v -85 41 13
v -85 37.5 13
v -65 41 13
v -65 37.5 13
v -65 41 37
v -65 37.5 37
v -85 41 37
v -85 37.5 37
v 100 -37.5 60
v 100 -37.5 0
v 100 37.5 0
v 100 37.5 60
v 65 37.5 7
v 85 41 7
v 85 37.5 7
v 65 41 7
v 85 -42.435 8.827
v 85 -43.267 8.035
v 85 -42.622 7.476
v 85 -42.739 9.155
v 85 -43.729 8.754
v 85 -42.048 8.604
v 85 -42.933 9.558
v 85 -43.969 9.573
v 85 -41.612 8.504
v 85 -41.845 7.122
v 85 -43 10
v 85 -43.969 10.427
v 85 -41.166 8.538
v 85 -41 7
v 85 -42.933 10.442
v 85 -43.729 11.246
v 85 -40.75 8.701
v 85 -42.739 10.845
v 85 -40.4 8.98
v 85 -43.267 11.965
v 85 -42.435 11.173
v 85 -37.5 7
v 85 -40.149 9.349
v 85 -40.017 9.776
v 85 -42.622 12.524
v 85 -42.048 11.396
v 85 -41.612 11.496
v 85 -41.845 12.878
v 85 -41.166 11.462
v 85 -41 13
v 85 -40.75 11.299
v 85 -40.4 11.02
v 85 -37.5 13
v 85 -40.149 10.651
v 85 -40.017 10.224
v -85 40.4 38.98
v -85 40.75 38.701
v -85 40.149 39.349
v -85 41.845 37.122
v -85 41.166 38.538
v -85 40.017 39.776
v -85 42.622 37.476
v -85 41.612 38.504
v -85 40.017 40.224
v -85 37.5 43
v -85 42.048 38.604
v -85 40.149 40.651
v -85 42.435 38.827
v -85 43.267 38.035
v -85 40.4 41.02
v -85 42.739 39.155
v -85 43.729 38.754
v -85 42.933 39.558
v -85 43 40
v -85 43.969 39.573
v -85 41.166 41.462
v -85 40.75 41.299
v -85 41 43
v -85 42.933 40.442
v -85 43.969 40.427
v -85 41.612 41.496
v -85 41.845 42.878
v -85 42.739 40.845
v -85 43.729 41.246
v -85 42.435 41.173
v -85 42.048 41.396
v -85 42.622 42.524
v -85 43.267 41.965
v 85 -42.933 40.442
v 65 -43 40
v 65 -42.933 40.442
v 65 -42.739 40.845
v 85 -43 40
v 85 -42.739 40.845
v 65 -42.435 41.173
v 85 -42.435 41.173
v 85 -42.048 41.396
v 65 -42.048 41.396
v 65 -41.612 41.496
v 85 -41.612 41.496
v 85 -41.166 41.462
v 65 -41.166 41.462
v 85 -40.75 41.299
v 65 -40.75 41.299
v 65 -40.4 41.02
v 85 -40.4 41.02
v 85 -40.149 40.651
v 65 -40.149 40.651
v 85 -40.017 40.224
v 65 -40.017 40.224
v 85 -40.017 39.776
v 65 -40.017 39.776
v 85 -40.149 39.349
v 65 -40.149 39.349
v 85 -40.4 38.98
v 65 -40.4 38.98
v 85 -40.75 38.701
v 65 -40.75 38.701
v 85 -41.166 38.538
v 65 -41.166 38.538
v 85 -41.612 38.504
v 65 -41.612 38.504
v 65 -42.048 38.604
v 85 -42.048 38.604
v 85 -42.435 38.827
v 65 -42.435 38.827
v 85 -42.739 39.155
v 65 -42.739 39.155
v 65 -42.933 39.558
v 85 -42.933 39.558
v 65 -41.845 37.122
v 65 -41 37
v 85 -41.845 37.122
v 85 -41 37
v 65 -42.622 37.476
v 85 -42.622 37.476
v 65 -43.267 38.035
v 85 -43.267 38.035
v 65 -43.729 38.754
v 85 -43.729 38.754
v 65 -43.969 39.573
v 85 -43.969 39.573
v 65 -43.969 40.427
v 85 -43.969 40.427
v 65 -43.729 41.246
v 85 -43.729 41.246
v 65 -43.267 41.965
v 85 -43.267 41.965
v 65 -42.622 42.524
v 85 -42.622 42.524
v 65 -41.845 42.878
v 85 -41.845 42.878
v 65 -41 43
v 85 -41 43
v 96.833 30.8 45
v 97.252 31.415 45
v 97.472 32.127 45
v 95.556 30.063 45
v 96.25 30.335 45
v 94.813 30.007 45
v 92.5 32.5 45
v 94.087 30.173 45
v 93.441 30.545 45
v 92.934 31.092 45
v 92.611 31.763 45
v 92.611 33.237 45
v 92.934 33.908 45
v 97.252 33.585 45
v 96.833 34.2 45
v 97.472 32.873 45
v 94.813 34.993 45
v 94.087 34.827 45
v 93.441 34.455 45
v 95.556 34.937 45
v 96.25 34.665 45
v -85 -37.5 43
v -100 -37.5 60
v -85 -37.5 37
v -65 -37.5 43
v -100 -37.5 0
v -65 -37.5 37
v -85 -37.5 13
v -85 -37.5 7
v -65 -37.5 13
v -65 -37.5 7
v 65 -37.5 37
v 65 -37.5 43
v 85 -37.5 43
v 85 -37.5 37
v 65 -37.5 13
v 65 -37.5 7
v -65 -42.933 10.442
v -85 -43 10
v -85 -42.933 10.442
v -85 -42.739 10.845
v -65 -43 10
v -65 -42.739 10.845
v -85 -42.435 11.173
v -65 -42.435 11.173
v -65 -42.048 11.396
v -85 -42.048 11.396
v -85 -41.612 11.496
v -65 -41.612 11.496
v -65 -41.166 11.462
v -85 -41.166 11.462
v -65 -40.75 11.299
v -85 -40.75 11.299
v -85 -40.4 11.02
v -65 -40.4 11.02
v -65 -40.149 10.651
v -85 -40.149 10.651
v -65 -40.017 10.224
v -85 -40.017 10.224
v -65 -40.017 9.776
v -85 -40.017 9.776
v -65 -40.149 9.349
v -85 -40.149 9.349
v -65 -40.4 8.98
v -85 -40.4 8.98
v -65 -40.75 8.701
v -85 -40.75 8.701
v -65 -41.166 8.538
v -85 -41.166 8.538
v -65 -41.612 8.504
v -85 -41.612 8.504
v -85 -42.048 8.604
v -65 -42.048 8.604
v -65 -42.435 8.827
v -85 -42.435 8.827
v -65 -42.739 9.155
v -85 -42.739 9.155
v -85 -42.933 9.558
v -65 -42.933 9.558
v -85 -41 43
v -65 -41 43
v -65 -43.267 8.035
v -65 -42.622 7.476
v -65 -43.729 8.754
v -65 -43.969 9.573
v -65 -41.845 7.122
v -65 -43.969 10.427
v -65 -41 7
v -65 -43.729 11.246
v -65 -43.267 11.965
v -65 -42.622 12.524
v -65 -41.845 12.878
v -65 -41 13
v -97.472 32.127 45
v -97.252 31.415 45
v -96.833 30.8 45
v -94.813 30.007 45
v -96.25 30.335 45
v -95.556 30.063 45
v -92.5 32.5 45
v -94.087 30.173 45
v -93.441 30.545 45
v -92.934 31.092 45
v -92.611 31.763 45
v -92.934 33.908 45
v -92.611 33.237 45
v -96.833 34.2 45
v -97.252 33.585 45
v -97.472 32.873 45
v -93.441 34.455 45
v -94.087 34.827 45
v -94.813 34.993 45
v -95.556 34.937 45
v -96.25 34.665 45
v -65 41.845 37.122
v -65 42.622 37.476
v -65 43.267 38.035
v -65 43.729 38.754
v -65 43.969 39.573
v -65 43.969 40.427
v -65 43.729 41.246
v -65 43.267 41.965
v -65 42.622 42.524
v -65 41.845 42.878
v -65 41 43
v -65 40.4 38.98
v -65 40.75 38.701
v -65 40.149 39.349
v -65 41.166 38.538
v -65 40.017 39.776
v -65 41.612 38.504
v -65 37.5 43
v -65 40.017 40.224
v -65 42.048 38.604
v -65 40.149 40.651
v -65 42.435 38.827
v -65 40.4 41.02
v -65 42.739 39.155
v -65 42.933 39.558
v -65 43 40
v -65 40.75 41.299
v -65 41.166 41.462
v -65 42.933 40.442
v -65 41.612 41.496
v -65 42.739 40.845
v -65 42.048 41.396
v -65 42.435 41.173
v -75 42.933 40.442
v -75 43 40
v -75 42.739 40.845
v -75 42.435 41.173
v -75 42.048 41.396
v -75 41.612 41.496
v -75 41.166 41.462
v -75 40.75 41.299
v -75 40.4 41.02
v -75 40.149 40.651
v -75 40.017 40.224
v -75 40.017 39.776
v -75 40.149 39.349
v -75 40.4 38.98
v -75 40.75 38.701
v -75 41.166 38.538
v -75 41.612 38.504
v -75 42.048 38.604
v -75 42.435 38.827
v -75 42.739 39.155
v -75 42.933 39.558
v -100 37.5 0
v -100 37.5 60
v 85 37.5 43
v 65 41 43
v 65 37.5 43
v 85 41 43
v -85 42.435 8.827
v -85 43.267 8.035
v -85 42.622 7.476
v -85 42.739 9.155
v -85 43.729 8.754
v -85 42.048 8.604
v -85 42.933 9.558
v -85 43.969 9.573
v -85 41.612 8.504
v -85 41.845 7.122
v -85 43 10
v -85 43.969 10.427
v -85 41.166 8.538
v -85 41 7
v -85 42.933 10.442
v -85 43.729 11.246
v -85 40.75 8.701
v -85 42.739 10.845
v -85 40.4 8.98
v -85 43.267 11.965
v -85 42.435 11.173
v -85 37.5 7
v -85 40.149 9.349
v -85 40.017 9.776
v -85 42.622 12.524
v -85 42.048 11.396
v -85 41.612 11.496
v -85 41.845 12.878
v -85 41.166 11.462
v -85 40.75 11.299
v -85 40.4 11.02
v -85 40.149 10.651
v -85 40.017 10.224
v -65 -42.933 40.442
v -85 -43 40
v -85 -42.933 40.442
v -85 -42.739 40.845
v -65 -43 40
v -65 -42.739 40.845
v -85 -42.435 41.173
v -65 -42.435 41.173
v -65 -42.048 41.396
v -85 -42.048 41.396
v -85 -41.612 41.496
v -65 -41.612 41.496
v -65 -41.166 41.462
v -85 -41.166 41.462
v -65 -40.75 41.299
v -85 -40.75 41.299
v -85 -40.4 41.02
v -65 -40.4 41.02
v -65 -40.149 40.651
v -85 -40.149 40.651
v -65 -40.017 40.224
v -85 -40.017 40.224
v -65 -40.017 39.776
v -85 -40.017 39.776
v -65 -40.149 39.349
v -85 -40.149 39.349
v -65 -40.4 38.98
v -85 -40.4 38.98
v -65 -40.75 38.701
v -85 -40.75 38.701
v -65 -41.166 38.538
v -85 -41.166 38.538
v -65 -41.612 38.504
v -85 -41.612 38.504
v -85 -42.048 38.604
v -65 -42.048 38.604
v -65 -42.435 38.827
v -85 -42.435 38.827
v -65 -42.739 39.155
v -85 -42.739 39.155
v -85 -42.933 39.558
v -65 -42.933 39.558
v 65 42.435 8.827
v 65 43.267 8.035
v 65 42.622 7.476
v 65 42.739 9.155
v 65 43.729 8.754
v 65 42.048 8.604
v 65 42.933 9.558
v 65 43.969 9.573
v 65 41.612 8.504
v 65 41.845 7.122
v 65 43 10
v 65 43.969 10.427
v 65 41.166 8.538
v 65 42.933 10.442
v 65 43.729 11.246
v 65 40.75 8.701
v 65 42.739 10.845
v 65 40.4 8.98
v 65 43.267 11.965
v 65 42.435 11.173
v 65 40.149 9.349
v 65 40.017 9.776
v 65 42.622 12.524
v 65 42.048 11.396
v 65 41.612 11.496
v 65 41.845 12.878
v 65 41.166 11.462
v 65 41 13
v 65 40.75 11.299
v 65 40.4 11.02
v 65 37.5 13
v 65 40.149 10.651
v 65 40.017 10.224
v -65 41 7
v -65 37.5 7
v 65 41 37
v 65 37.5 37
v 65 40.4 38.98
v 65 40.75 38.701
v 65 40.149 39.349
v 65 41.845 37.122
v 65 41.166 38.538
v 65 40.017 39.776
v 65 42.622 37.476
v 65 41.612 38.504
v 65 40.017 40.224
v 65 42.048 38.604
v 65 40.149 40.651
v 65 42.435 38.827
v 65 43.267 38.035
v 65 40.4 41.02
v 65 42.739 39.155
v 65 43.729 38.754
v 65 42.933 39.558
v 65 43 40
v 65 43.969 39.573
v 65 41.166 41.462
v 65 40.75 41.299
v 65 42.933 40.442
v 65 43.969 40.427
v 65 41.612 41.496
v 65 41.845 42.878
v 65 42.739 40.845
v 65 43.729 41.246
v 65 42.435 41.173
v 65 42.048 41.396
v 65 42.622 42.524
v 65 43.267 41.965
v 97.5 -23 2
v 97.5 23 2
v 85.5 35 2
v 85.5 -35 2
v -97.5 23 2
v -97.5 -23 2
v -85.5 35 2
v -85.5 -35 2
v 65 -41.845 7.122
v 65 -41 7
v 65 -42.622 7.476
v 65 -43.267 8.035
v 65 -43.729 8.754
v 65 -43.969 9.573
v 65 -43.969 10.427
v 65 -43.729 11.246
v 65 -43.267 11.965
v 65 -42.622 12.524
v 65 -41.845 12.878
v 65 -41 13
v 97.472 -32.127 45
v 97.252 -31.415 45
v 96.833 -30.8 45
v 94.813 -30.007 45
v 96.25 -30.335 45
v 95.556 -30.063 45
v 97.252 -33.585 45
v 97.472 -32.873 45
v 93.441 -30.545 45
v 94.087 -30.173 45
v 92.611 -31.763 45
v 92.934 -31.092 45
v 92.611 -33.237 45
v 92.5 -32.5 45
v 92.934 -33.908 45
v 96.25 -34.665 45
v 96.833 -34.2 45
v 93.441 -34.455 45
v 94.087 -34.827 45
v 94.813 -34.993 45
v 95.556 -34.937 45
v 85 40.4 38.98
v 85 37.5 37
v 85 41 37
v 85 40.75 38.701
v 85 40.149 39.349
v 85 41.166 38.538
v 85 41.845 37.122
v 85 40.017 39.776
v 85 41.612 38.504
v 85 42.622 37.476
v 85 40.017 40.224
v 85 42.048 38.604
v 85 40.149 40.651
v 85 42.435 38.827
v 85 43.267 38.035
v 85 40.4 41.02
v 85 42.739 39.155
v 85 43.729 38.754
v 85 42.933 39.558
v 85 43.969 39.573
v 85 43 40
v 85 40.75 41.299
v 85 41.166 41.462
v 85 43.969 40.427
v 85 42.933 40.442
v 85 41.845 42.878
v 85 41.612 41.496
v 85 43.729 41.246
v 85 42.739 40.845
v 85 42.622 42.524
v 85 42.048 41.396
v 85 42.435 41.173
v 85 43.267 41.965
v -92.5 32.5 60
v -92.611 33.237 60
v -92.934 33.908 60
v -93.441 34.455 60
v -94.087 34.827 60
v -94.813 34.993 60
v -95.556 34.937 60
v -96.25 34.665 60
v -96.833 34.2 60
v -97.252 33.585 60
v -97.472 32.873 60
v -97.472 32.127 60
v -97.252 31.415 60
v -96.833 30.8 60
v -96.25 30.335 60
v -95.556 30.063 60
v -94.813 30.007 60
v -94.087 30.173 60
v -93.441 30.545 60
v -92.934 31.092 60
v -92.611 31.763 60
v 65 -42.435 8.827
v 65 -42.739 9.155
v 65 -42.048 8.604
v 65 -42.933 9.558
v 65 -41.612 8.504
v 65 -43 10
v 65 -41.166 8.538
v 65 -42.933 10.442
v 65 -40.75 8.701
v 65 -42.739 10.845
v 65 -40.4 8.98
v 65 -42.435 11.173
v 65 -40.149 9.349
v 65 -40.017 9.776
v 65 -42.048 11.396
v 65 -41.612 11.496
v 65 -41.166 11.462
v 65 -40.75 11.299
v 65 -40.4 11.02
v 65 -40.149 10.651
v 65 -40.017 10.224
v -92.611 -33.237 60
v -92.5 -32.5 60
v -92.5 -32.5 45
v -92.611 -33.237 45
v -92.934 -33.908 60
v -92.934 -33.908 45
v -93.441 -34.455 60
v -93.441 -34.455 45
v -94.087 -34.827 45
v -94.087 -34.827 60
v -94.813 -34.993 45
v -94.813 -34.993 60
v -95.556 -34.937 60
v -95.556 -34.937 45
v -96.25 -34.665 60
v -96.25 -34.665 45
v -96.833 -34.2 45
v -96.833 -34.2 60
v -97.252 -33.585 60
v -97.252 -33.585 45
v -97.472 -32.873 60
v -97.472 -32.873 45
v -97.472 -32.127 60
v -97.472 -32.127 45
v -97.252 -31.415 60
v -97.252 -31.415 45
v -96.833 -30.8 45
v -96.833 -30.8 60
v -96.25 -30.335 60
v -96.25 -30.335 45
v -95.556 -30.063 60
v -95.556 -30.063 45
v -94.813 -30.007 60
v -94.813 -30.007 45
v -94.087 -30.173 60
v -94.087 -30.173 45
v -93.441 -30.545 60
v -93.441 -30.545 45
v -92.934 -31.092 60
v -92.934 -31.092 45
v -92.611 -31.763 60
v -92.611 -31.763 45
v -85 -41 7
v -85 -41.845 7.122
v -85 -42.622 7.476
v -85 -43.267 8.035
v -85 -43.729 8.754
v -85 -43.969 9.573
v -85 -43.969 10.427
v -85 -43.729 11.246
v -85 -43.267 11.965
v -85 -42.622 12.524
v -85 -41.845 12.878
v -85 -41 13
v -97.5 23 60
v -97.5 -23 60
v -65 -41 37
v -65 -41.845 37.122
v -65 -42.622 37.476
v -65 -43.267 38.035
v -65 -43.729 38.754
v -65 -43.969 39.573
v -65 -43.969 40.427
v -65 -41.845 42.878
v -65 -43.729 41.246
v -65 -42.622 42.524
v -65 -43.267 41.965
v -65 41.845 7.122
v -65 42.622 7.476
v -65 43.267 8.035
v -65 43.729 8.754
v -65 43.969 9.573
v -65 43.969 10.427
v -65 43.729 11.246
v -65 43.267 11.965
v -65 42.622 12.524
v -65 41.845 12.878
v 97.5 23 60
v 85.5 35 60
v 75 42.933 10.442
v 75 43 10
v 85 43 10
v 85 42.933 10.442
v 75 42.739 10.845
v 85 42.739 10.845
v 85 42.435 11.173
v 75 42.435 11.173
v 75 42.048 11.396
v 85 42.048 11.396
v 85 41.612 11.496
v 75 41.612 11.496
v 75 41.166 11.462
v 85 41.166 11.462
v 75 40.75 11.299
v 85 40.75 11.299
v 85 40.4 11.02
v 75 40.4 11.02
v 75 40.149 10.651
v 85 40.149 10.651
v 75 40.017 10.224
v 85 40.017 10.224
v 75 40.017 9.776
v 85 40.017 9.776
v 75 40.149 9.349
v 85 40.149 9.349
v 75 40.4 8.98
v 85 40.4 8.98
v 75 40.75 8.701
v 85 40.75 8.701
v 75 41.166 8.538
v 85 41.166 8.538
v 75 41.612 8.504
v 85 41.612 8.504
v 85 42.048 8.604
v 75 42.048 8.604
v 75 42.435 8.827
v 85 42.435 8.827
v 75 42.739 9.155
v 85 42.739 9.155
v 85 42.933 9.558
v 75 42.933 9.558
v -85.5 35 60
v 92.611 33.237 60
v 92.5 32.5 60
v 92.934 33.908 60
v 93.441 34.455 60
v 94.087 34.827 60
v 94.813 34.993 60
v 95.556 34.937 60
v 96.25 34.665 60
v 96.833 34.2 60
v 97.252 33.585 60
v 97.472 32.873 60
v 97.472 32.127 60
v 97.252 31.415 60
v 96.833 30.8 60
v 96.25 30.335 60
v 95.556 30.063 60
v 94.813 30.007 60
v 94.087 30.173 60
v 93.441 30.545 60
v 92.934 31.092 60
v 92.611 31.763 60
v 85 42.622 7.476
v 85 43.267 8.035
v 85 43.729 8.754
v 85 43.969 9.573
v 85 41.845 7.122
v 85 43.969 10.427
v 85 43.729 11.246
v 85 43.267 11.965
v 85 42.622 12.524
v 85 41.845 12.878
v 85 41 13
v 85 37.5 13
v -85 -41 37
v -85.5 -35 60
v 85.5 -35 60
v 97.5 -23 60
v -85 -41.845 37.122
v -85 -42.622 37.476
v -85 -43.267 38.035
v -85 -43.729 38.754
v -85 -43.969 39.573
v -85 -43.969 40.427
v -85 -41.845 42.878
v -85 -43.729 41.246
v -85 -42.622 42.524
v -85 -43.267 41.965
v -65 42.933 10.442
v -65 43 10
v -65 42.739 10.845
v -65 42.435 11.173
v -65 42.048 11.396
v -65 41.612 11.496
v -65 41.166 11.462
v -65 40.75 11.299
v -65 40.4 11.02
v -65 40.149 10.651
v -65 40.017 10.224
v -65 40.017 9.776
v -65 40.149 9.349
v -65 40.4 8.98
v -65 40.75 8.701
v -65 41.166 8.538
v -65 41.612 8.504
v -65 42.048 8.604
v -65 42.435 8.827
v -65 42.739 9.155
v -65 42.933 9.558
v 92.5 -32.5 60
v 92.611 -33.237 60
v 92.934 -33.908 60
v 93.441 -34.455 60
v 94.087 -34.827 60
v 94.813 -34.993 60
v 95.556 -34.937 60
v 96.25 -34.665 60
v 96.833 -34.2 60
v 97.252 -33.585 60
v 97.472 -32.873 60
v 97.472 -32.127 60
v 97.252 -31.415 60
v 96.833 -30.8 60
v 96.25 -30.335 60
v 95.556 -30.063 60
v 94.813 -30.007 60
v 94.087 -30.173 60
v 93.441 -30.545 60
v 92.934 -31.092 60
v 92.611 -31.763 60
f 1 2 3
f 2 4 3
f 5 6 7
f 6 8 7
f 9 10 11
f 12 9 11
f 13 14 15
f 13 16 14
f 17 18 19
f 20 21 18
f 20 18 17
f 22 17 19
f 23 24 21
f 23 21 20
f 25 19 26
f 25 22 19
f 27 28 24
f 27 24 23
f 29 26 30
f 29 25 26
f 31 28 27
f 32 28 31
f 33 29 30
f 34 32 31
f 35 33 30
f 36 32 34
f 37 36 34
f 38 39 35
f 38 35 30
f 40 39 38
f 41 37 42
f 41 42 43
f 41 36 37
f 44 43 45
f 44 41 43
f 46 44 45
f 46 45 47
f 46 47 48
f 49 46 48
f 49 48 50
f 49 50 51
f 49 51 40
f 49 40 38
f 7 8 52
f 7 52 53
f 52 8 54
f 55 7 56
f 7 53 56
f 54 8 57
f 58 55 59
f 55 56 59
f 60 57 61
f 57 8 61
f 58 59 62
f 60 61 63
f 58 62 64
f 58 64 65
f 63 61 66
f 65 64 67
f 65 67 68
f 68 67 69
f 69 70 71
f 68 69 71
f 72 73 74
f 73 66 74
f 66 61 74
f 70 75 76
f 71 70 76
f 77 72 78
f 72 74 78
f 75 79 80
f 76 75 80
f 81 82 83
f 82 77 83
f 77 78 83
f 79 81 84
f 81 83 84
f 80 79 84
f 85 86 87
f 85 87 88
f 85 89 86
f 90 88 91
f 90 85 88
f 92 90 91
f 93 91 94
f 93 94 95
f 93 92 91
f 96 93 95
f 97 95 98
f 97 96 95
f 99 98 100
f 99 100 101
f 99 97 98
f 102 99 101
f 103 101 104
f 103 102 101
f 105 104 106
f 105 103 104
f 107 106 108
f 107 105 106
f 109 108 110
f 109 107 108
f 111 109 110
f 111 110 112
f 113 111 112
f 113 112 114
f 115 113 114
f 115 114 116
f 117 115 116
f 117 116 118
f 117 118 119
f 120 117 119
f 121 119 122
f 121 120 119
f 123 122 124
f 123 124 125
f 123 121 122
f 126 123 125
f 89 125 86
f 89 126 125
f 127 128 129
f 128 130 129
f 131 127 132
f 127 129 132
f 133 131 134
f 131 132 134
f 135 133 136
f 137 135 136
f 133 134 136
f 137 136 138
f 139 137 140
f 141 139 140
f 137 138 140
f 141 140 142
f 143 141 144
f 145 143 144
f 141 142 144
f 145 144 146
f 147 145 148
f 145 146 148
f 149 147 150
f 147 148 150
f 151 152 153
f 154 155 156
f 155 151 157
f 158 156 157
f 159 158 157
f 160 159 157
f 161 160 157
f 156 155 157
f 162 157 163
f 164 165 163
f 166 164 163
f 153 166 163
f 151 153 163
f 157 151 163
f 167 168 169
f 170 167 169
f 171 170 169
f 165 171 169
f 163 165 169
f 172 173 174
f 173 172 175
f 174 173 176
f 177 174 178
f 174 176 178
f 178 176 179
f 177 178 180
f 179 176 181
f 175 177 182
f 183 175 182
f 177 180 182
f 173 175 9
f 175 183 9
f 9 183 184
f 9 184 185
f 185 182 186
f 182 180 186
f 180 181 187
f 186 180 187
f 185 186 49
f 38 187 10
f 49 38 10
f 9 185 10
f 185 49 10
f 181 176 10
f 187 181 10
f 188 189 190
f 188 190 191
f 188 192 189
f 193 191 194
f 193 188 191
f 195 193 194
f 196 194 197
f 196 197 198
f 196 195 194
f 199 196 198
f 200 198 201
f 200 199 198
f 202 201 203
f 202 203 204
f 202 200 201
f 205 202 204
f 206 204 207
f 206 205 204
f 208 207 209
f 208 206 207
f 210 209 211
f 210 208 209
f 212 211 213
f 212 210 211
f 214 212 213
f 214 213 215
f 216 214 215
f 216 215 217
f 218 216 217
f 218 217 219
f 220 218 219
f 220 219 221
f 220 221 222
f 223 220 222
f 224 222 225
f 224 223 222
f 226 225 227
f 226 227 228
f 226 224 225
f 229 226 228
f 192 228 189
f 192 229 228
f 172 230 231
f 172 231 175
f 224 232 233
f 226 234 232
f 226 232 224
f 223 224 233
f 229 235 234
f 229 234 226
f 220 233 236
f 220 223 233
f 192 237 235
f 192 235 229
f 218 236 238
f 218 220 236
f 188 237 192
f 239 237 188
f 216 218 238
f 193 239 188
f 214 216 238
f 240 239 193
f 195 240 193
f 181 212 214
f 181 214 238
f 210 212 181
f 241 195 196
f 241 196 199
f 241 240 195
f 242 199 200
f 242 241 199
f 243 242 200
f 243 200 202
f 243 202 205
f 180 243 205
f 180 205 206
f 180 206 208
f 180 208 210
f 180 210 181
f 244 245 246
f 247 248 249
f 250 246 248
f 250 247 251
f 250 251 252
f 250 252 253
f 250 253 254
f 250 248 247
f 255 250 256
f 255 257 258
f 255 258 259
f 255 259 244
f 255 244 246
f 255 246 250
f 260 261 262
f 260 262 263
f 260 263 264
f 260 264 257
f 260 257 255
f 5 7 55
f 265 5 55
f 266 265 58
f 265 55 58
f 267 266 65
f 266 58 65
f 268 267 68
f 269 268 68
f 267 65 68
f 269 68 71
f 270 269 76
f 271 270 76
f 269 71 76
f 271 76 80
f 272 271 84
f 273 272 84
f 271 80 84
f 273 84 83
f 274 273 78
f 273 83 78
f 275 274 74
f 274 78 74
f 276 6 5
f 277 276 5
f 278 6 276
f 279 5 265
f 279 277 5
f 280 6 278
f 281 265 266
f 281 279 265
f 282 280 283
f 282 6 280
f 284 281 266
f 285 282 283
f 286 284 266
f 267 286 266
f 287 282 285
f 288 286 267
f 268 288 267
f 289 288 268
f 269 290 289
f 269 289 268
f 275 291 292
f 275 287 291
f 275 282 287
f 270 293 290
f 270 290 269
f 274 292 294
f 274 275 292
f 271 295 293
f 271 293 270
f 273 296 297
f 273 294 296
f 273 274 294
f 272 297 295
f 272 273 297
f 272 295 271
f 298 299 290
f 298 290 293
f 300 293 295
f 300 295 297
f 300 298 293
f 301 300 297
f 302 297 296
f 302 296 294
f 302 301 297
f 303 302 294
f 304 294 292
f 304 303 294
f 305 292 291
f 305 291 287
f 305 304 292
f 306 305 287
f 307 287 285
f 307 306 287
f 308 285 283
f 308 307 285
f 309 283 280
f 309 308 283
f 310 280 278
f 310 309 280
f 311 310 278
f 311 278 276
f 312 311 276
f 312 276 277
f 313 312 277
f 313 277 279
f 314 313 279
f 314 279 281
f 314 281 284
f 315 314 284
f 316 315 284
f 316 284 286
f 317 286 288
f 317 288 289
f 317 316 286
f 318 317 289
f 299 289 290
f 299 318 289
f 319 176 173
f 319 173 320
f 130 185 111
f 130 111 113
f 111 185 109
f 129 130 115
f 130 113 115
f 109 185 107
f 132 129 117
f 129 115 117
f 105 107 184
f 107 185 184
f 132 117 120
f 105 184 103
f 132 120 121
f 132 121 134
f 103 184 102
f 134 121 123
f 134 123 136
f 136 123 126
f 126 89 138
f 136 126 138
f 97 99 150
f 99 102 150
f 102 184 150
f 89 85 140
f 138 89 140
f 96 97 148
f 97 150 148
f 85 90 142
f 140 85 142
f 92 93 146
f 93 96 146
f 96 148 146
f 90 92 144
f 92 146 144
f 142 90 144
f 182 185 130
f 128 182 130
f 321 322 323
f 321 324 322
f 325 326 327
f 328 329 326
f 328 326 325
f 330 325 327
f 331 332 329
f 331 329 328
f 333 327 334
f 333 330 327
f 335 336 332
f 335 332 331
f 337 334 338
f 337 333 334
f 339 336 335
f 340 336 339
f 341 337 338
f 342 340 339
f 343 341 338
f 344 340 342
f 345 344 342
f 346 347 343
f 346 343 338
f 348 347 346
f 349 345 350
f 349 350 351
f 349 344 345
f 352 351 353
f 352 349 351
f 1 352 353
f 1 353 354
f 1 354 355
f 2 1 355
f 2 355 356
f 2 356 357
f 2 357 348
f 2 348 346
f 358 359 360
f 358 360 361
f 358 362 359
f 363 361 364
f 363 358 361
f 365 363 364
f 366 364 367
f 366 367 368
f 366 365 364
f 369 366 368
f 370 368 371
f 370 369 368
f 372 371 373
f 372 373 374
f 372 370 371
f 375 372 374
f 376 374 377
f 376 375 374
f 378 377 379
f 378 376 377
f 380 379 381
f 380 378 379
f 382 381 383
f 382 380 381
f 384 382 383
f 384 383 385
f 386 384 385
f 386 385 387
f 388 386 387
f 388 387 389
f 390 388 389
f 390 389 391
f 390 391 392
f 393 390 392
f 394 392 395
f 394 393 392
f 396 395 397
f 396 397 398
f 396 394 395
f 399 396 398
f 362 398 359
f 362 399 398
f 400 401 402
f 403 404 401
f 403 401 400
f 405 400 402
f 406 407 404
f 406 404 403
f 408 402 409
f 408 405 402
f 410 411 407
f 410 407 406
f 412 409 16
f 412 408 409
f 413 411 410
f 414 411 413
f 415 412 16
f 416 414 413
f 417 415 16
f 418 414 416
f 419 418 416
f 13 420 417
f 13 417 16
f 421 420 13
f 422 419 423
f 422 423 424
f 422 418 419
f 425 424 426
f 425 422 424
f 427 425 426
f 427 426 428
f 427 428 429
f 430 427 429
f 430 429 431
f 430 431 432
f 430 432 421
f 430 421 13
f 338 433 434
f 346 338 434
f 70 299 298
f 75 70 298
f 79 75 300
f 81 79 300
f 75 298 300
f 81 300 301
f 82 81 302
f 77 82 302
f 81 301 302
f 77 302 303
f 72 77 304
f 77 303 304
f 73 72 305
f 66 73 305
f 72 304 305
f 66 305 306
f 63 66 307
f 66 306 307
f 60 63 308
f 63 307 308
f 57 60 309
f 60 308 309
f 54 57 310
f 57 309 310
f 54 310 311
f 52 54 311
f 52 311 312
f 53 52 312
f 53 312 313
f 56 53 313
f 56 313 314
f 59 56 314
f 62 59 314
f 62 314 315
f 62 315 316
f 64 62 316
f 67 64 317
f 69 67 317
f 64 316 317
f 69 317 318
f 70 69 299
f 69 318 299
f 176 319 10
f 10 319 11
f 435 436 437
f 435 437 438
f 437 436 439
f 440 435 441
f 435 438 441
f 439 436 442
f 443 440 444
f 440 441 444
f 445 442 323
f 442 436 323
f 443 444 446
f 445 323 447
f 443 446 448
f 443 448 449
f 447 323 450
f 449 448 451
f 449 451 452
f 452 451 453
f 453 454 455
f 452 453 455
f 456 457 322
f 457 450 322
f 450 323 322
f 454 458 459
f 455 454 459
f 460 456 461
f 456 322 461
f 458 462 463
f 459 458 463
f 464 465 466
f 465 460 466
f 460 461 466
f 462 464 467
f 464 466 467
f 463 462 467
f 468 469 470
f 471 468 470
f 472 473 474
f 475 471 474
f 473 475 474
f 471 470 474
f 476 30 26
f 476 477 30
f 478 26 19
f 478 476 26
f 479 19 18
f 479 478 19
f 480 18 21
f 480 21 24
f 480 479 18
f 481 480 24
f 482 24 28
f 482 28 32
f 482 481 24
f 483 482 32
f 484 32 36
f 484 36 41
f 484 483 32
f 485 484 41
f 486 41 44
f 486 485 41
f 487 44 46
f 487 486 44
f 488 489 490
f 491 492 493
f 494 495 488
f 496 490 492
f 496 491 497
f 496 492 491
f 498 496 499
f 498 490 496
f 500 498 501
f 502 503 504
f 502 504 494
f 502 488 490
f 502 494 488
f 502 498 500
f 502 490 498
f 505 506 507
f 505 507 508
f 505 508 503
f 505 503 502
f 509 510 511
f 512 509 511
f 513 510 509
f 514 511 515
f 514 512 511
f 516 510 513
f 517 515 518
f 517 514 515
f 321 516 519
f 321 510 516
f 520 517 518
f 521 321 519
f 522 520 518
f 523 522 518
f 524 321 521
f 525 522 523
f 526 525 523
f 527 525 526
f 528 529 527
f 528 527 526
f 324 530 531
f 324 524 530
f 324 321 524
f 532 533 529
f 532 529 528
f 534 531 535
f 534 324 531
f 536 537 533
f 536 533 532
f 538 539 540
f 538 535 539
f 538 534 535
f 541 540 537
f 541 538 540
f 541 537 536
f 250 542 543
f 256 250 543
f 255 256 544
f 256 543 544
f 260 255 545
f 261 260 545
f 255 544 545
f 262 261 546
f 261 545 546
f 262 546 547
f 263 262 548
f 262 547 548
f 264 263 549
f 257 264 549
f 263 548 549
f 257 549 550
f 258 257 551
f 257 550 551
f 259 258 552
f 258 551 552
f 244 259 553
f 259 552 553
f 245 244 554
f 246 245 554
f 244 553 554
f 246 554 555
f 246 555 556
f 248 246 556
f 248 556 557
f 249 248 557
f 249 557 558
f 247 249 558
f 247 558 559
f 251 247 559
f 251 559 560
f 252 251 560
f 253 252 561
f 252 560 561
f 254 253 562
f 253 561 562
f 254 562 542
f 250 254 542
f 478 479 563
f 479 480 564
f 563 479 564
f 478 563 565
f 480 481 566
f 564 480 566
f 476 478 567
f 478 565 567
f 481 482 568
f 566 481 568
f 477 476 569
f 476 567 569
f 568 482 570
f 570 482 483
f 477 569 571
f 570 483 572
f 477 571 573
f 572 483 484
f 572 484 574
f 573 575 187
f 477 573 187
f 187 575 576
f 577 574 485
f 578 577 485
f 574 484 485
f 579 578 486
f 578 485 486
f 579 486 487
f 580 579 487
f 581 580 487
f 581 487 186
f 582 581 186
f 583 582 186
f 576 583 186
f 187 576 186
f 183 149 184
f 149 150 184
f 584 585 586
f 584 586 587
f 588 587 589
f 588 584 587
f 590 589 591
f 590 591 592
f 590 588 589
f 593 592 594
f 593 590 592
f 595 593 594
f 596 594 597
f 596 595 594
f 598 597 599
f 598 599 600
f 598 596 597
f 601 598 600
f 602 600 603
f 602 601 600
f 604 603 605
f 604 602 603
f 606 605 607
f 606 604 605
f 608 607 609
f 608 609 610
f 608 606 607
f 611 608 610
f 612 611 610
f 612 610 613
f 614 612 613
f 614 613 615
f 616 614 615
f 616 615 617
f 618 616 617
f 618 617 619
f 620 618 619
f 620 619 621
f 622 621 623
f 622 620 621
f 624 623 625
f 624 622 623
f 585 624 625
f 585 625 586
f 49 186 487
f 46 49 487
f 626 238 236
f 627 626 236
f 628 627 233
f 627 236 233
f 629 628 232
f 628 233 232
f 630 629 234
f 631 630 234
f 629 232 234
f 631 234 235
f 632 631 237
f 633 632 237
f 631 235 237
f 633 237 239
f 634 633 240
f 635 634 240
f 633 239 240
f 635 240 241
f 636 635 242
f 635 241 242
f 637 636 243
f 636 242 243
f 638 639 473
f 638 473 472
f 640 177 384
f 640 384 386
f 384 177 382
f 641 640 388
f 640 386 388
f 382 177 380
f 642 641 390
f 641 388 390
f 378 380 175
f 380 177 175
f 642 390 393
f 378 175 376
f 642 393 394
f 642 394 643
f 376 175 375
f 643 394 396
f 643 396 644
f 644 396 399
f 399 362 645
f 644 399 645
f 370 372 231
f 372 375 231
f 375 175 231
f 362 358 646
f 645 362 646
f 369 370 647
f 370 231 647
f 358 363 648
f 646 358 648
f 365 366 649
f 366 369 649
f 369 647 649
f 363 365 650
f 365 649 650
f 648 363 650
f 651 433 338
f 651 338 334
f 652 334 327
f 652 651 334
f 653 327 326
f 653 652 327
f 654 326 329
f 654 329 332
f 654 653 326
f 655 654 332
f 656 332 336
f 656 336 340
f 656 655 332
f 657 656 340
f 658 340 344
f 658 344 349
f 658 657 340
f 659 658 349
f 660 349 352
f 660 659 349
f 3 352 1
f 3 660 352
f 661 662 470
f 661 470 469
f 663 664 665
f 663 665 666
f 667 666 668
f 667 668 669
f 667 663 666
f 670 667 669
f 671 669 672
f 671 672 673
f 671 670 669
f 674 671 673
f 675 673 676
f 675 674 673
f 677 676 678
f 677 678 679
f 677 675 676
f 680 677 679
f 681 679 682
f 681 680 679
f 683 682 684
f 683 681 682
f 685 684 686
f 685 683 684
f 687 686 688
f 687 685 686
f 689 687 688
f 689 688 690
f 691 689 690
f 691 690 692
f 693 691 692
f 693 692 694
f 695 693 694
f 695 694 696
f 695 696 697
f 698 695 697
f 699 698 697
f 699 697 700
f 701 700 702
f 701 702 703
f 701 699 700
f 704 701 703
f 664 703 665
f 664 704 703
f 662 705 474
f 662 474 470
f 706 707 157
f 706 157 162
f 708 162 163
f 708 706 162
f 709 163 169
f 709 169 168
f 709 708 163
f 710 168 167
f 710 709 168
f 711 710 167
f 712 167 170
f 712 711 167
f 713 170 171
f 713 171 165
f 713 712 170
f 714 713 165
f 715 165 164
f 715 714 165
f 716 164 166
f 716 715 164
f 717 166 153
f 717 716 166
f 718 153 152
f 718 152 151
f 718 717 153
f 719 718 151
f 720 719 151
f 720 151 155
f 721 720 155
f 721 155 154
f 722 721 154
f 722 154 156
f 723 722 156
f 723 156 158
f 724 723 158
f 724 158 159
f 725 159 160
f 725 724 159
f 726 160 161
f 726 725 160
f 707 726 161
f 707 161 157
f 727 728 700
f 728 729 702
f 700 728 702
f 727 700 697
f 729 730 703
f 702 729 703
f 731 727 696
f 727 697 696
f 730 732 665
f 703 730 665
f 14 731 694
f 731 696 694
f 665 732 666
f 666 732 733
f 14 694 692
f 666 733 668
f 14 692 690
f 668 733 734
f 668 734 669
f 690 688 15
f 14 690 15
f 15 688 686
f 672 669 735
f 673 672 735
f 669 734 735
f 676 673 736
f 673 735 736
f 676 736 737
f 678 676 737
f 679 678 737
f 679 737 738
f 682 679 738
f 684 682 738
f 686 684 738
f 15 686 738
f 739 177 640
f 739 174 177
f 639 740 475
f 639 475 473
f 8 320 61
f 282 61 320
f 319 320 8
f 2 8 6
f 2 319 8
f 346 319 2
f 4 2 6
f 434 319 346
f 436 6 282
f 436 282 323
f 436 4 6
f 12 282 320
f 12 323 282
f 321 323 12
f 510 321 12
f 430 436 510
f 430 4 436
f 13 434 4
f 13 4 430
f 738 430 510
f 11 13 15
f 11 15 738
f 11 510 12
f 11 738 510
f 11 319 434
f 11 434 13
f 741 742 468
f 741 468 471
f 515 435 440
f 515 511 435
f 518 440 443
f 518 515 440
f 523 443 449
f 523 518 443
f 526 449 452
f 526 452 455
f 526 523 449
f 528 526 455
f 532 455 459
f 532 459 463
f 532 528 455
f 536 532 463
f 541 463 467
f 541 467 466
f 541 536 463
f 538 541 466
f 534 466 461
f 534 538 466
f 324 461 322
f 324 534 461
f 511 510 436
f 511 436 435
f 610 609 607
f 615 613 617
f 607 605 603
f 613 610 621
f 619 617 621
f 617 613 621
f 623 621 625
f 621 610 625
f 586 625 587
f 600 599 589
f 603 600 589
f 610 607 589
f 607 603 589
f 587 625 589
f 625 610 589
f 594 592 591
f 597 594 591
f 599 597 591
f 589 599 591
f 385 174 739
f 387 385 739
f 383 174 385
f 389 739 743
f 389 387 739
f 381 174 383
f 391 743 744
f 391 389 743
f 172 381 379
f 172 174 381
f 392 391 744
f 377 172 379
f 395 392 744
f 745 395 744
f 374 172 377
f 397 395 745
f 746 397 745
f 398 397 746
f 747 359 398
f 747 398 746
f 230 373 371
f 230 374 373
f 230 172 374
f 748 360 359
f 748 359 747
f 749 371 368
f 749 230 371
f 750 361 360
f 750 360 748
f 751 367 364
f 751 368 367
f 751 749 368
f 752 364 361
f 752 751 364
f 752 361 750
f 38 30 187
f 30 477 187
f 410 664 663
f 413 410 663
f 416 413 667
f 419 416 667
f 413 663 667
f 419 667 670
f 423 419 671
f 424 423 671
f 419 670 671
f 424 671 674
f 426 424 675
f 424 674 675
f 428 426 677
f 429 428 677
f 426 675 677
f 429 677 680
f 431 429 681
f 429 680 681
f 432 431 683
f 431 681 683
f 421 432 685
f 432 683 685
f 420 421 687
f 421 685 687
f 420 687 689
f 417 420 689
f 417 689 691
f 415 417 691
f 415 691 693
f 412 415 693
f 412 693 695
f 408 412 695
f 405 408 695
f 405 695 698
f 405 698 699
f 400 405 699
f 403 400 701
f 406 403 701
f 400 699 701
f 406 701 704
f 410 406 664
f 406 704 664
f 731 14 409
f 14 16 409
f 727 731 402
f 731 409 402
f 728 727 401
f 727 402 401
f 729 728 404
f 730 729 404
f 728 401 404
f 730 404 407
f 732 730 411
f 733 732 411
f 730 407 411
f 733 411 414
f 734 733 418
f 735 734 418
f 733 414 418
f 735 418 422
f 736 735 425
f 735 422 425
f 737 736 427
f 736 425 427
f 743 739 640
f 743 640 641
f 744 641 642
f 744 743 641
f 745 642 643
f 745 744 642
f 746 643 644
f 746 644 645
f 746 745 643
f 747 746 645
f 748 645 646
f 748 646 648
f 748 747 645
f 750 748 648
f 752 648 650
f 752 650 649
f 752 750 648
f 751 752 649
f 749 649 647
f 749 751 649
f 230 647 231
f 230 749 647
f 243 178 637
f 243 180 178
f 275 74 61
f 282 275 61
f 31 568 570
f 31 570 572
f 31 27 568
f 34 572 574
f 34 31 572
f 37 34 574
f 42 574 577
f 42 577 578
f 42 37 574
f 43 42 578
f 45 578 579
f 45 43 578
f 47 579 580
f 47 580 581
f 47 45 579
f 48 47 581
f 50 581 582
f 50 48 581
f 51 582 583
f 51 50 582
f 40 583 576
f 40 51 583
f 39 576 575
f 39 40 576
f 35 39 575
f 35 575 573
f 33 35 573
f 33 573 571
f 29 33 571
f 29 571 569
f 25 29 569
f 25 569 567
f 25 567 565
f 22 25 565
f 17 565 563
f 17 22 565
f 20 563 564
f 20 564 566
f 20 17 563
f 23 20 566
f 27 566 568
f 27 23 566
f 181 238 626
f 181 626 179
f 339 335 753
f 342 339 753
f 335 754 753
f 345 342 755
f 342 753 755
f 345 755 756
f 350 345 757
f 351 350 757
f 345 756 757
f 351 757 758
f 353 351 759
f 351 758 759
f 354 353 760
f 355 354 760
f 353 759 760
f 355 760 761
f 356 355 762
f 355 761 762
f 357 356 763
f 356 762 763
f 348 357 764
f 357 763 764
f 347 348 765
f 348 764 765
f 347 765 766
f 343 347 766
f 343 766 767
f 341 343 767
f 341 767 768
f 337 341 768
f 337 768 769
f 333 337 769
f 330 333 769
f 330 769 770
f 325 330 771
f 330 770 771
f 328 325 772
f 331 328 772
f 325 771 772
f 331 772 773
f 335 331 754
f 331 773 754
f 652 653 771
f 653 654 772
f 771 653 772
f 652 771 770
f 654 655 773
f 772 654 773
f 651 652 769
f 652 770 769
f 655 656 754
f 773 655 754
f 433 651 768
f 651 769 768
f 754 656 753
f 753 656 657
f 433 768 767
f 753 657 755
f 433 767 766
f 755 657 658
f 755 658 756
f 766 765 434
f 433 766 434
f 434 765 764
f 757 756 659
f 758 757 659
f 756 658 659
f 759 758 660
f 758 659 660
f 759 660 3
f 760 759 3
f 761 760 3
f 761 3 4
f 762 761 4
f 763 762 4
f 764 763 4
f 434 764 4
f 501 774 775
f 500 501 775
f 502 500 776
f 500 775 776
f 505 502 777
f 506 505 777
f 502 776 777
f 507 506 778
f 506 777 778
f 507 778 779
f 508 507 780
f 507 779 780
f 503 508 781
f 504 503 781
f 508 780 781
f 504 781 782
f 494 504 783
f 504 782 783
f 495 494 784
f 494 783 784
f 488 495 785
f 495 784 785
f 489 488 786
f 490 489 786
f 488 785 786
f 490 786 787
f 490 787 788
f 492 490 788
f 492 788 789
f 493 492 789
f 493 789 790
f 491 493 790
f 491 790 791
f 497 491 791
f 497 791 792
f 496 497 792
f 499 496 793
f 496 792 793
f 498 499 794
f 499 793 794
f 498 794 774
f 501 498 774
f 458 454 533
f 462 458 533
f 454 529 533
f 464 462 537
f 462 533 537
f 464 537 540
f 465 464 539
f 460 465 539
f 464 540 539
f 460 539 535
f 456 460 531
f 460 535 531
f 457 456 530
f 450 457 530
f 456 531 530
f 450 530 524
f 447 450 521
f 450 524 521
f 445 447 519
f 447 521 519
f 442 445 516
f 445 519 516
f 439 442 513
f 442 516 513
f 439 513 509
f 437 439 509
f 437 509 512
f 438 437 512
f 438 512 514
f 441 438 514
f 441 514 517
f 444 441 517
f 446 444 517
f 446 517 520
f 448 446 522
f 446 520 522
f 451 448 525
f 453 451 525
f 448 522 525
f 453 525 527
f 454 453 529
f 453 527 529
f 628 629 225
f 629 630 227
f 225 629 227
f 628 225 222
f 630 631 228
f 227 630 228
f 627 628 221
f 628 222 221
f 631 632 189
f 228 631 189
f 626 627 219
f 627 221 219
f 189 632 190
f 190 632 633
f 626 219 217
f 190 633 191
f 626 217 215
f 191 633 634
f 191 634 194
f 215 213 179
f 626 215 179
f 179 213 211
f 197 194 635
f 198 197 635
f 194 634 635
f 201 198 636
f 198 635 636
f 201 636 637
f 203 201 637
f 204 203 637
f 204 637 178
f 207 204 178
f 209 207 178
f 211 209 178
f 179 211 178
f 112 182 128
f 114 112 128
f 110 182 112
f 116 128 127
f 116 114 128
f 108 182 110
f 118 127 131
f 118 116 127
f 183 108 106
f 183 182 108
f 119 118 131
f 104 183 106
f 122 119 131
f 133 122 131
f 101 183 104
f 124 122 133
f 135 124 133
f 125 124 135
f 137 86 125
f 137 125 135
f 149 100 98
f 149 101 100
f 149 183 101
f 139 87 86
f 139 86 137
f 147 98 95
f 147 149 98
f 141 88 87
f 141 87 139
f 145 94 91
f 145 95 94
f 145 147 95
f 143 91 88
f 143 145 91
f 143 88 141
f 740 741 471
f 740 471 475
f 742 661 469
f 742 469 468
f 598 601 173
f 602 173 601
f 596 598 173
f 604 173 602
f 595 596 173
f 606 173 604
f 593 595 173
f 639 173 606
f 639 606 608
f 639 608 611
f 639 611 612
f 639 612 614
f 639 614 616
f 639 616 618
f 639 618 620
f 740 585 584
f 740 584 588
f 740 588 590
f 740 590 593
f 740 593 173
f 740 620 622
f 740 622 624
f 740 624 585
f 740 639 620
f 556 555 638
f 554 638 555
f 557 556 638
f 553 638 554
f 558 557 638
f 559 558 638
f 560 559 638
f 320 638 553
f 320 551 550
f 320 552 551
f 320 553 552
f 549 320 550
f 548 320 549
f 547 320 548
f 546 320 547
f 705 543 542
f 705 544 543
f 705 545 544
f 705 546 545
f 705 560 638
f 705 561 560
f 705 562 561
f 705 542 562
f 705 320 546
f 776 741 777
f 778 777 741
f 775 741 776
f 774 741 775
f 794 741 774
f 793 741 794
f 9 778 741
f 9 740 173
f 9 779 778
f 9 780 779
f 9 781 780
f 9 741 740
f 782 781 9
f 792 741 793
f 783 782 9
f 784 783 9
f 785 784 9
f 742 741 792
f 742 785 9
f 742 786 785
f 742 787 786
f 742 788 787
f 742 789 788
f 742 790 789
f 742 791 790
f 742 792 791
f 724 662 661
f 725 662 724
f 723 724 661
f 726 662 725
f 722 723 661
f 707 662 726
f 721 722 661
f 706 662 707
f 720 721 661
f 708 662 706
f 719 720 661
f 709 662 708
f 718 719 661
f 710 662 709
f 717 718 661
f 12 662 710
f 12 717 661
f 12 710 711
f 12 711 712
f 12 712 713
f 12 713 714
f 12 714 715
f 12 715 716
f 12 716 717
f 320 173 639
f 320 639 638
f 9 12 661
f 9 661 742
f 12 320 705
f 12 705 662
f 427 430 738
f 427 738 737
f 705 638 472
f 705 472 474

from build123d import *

# Parameters (mm, degrees)
SKETCH_W                      = 200
SKETCH_H                      = 75
PAD_DEPTH                     = 60
POCKET_DEPTH                  = 58
SKETCH002_R                   = 2.5
POCKET001_DEPTH               = 15
SKETCH002_MIRRORED_2_R        = 2.5
POCKET001_MIRRORED_2_DEPTH    = 15
PAD001_DEPTH                  = 10
PAD001_MIRRORED002_2_DEPTH    = 10
SKETCH004_R                   = 1.5
POCKET002_DEPTH               = 10
SKETCH004_MIRRORED004_2_R     = 1.5
POCKET002_MIRRORED004_2_DEPTH = 10


with BuildPart() as part:
    # Sketch (on DatumPlane) → Pad (new body)
    with BuildSketch(Plane.XY):
        Rectangle(SKETCH_W, SKETCH_H)
    extrude(amount=PAD_DEPTH)

    # Sketch001 (on DatumPlane) → Pocket (cut)
    with BuildSketch(Plane.XY.offset(60)):
        Polygon((-97.5, -23), (-97.5, 23), (-85.5, 35), (85.5, 35), (97.5, 23), (97.5, -23), (85.5, -35), (-85.5, -35), align=None)
    extrude(amount=-POCKET_DEPTH, mode=Mode.SUBTRACT)

    # Sketch002 (on DatumPlane) → Pocket001 (cut)
    with BuildSketch(Plane.XY.offset(60)):
        with Locations((-95, 32.5)):
            Circle(SKETCH002_R)
    pocket001 = extrude(amount=-POCKET001_DEPTH, mode=Mode.SUBTRACT)

    # Sketch002 Mirrored 2 → Pocket001 Mirrored 2 (cut)
    with BuildSketch(Plane(origin=(0, 0, 60), x_dir=(-1, 0, 0), z_dir=(0, 0, -1))):
        with Locations((-95, 32.5)):
            Circle(SKETCH002_MIRRORED_2_R)
    pocket001_mirrored_2 = extrude(amount=POCKET001_MIRRORED_2_DEPTH, mode=Mode.SUBTRACT)

    # Mirrored001: Pocket001, Pocket001 Mirrored 2 across XZ
    add(pocket001.mirror(Plane.XZ), mode=Mode.SUBTRACT)
    add(pocket001_mirrored_2.mirror(Plane.XZ), mode=Mode.SUBTRACT)

    # Sketch003 (on DatumPlane) → Pad001 (join, symmetric)
    with BuildSketch(Plane.YZ.offset(-75)):
        with BuildLine():
            Line((41, 43), (37.5, 43))
            Line((37.5, 43), (37.5, 37))
            Line((37.5, 37), (41, 37))
            ThreePointArc((41, 37), (44, 40), (41, 43))
        make_face()
        with BuildLine():
            Line((41, 7), (37.5, 7))
            Line((37.5, 7), (37.5, 13))
            Line((37.5, 13), (41, 13))
            ThreePointArc((41, 7), (44, 10), (41, 13))
        make_face()
    pad001 = extrude(amount=PAD001_DEPTH, both=True)

    # Sketch003 Mirrored002 2 → Pad001 Mirrored002 2 (add, symmetric)
    with BuildSketch(Plane.YZ.offset(75)):
        with BuildLine():
            Line((41, 43), (37.5, 43))
            Line((37.5, 43), (37.5, 37))
            Line((37.5, 37), (41, 37))
            ThreePointArc((41, 37), (44, 40), (41, 43))
        make_face()
        with BuildLine():
            Line((41, 7), (37.5, 7))
            Line((37.5, 7), (37.5, 13))
            Line((37.5, 13), (41, 13))
            ThreePointArc((41, 7), (44, 10), (41, 13))
        make_face()
    pad001_mirrored002_2 = extrude(amount=-PAD001_MIRRORED002_2_DEPTH, both=True)

    # Mirrored003: Pad001, Pad001 Mirrored002 2 across XZ
    add(pad001.mirror(Plane.XZ))
    add(pad001_mirrored002_2.mirror(Plane.XZ))

    # Sketch004 (on DatumPlane) → Pocket002 (cut, symmetric)
    with BuildSketch(Plane.YZ.offset(-75)):
        with Locations((41.5, 40)):
            Circle(SKETCH004_R)
        with Locations((41.5, 10)):
            Circle(SKETCH004_R)
    pocket002 = extrude(amount=POCKET002_DEPTH, both=True, mode=Mode.SUBTRACT)

    # Sketch004 Mirrored004 2 → Pocket002 Mirrored004 2 (cut, symmetric)
    with BuildSketch(Plane.YZ.offset(75)):
        with Locations((41.5, 40)):
            Circle(SKETCH004_MIRRORED004_2_R)
        with Locations((41.5, 10)):
            Circle(SKETCH004_MIRRORED004_2_R)
    pocket002_mirrored004_2 = extrude(amount=-POCKET002_MIRRORED004_2_DEPTH, both=True, mode=Mode.SUBTRACT)

    # Mirrored005: Pocket002, Pocket002 Mirrored004 2 across XZ
    add(pocket002.mirror(Plane.XZ), mode=Mode.SUBTRACT)
    add(pocket002_mirrored004_2.mirror(Plane.XZ), mode=Mode.SUBTRACT)


solid = part.part
